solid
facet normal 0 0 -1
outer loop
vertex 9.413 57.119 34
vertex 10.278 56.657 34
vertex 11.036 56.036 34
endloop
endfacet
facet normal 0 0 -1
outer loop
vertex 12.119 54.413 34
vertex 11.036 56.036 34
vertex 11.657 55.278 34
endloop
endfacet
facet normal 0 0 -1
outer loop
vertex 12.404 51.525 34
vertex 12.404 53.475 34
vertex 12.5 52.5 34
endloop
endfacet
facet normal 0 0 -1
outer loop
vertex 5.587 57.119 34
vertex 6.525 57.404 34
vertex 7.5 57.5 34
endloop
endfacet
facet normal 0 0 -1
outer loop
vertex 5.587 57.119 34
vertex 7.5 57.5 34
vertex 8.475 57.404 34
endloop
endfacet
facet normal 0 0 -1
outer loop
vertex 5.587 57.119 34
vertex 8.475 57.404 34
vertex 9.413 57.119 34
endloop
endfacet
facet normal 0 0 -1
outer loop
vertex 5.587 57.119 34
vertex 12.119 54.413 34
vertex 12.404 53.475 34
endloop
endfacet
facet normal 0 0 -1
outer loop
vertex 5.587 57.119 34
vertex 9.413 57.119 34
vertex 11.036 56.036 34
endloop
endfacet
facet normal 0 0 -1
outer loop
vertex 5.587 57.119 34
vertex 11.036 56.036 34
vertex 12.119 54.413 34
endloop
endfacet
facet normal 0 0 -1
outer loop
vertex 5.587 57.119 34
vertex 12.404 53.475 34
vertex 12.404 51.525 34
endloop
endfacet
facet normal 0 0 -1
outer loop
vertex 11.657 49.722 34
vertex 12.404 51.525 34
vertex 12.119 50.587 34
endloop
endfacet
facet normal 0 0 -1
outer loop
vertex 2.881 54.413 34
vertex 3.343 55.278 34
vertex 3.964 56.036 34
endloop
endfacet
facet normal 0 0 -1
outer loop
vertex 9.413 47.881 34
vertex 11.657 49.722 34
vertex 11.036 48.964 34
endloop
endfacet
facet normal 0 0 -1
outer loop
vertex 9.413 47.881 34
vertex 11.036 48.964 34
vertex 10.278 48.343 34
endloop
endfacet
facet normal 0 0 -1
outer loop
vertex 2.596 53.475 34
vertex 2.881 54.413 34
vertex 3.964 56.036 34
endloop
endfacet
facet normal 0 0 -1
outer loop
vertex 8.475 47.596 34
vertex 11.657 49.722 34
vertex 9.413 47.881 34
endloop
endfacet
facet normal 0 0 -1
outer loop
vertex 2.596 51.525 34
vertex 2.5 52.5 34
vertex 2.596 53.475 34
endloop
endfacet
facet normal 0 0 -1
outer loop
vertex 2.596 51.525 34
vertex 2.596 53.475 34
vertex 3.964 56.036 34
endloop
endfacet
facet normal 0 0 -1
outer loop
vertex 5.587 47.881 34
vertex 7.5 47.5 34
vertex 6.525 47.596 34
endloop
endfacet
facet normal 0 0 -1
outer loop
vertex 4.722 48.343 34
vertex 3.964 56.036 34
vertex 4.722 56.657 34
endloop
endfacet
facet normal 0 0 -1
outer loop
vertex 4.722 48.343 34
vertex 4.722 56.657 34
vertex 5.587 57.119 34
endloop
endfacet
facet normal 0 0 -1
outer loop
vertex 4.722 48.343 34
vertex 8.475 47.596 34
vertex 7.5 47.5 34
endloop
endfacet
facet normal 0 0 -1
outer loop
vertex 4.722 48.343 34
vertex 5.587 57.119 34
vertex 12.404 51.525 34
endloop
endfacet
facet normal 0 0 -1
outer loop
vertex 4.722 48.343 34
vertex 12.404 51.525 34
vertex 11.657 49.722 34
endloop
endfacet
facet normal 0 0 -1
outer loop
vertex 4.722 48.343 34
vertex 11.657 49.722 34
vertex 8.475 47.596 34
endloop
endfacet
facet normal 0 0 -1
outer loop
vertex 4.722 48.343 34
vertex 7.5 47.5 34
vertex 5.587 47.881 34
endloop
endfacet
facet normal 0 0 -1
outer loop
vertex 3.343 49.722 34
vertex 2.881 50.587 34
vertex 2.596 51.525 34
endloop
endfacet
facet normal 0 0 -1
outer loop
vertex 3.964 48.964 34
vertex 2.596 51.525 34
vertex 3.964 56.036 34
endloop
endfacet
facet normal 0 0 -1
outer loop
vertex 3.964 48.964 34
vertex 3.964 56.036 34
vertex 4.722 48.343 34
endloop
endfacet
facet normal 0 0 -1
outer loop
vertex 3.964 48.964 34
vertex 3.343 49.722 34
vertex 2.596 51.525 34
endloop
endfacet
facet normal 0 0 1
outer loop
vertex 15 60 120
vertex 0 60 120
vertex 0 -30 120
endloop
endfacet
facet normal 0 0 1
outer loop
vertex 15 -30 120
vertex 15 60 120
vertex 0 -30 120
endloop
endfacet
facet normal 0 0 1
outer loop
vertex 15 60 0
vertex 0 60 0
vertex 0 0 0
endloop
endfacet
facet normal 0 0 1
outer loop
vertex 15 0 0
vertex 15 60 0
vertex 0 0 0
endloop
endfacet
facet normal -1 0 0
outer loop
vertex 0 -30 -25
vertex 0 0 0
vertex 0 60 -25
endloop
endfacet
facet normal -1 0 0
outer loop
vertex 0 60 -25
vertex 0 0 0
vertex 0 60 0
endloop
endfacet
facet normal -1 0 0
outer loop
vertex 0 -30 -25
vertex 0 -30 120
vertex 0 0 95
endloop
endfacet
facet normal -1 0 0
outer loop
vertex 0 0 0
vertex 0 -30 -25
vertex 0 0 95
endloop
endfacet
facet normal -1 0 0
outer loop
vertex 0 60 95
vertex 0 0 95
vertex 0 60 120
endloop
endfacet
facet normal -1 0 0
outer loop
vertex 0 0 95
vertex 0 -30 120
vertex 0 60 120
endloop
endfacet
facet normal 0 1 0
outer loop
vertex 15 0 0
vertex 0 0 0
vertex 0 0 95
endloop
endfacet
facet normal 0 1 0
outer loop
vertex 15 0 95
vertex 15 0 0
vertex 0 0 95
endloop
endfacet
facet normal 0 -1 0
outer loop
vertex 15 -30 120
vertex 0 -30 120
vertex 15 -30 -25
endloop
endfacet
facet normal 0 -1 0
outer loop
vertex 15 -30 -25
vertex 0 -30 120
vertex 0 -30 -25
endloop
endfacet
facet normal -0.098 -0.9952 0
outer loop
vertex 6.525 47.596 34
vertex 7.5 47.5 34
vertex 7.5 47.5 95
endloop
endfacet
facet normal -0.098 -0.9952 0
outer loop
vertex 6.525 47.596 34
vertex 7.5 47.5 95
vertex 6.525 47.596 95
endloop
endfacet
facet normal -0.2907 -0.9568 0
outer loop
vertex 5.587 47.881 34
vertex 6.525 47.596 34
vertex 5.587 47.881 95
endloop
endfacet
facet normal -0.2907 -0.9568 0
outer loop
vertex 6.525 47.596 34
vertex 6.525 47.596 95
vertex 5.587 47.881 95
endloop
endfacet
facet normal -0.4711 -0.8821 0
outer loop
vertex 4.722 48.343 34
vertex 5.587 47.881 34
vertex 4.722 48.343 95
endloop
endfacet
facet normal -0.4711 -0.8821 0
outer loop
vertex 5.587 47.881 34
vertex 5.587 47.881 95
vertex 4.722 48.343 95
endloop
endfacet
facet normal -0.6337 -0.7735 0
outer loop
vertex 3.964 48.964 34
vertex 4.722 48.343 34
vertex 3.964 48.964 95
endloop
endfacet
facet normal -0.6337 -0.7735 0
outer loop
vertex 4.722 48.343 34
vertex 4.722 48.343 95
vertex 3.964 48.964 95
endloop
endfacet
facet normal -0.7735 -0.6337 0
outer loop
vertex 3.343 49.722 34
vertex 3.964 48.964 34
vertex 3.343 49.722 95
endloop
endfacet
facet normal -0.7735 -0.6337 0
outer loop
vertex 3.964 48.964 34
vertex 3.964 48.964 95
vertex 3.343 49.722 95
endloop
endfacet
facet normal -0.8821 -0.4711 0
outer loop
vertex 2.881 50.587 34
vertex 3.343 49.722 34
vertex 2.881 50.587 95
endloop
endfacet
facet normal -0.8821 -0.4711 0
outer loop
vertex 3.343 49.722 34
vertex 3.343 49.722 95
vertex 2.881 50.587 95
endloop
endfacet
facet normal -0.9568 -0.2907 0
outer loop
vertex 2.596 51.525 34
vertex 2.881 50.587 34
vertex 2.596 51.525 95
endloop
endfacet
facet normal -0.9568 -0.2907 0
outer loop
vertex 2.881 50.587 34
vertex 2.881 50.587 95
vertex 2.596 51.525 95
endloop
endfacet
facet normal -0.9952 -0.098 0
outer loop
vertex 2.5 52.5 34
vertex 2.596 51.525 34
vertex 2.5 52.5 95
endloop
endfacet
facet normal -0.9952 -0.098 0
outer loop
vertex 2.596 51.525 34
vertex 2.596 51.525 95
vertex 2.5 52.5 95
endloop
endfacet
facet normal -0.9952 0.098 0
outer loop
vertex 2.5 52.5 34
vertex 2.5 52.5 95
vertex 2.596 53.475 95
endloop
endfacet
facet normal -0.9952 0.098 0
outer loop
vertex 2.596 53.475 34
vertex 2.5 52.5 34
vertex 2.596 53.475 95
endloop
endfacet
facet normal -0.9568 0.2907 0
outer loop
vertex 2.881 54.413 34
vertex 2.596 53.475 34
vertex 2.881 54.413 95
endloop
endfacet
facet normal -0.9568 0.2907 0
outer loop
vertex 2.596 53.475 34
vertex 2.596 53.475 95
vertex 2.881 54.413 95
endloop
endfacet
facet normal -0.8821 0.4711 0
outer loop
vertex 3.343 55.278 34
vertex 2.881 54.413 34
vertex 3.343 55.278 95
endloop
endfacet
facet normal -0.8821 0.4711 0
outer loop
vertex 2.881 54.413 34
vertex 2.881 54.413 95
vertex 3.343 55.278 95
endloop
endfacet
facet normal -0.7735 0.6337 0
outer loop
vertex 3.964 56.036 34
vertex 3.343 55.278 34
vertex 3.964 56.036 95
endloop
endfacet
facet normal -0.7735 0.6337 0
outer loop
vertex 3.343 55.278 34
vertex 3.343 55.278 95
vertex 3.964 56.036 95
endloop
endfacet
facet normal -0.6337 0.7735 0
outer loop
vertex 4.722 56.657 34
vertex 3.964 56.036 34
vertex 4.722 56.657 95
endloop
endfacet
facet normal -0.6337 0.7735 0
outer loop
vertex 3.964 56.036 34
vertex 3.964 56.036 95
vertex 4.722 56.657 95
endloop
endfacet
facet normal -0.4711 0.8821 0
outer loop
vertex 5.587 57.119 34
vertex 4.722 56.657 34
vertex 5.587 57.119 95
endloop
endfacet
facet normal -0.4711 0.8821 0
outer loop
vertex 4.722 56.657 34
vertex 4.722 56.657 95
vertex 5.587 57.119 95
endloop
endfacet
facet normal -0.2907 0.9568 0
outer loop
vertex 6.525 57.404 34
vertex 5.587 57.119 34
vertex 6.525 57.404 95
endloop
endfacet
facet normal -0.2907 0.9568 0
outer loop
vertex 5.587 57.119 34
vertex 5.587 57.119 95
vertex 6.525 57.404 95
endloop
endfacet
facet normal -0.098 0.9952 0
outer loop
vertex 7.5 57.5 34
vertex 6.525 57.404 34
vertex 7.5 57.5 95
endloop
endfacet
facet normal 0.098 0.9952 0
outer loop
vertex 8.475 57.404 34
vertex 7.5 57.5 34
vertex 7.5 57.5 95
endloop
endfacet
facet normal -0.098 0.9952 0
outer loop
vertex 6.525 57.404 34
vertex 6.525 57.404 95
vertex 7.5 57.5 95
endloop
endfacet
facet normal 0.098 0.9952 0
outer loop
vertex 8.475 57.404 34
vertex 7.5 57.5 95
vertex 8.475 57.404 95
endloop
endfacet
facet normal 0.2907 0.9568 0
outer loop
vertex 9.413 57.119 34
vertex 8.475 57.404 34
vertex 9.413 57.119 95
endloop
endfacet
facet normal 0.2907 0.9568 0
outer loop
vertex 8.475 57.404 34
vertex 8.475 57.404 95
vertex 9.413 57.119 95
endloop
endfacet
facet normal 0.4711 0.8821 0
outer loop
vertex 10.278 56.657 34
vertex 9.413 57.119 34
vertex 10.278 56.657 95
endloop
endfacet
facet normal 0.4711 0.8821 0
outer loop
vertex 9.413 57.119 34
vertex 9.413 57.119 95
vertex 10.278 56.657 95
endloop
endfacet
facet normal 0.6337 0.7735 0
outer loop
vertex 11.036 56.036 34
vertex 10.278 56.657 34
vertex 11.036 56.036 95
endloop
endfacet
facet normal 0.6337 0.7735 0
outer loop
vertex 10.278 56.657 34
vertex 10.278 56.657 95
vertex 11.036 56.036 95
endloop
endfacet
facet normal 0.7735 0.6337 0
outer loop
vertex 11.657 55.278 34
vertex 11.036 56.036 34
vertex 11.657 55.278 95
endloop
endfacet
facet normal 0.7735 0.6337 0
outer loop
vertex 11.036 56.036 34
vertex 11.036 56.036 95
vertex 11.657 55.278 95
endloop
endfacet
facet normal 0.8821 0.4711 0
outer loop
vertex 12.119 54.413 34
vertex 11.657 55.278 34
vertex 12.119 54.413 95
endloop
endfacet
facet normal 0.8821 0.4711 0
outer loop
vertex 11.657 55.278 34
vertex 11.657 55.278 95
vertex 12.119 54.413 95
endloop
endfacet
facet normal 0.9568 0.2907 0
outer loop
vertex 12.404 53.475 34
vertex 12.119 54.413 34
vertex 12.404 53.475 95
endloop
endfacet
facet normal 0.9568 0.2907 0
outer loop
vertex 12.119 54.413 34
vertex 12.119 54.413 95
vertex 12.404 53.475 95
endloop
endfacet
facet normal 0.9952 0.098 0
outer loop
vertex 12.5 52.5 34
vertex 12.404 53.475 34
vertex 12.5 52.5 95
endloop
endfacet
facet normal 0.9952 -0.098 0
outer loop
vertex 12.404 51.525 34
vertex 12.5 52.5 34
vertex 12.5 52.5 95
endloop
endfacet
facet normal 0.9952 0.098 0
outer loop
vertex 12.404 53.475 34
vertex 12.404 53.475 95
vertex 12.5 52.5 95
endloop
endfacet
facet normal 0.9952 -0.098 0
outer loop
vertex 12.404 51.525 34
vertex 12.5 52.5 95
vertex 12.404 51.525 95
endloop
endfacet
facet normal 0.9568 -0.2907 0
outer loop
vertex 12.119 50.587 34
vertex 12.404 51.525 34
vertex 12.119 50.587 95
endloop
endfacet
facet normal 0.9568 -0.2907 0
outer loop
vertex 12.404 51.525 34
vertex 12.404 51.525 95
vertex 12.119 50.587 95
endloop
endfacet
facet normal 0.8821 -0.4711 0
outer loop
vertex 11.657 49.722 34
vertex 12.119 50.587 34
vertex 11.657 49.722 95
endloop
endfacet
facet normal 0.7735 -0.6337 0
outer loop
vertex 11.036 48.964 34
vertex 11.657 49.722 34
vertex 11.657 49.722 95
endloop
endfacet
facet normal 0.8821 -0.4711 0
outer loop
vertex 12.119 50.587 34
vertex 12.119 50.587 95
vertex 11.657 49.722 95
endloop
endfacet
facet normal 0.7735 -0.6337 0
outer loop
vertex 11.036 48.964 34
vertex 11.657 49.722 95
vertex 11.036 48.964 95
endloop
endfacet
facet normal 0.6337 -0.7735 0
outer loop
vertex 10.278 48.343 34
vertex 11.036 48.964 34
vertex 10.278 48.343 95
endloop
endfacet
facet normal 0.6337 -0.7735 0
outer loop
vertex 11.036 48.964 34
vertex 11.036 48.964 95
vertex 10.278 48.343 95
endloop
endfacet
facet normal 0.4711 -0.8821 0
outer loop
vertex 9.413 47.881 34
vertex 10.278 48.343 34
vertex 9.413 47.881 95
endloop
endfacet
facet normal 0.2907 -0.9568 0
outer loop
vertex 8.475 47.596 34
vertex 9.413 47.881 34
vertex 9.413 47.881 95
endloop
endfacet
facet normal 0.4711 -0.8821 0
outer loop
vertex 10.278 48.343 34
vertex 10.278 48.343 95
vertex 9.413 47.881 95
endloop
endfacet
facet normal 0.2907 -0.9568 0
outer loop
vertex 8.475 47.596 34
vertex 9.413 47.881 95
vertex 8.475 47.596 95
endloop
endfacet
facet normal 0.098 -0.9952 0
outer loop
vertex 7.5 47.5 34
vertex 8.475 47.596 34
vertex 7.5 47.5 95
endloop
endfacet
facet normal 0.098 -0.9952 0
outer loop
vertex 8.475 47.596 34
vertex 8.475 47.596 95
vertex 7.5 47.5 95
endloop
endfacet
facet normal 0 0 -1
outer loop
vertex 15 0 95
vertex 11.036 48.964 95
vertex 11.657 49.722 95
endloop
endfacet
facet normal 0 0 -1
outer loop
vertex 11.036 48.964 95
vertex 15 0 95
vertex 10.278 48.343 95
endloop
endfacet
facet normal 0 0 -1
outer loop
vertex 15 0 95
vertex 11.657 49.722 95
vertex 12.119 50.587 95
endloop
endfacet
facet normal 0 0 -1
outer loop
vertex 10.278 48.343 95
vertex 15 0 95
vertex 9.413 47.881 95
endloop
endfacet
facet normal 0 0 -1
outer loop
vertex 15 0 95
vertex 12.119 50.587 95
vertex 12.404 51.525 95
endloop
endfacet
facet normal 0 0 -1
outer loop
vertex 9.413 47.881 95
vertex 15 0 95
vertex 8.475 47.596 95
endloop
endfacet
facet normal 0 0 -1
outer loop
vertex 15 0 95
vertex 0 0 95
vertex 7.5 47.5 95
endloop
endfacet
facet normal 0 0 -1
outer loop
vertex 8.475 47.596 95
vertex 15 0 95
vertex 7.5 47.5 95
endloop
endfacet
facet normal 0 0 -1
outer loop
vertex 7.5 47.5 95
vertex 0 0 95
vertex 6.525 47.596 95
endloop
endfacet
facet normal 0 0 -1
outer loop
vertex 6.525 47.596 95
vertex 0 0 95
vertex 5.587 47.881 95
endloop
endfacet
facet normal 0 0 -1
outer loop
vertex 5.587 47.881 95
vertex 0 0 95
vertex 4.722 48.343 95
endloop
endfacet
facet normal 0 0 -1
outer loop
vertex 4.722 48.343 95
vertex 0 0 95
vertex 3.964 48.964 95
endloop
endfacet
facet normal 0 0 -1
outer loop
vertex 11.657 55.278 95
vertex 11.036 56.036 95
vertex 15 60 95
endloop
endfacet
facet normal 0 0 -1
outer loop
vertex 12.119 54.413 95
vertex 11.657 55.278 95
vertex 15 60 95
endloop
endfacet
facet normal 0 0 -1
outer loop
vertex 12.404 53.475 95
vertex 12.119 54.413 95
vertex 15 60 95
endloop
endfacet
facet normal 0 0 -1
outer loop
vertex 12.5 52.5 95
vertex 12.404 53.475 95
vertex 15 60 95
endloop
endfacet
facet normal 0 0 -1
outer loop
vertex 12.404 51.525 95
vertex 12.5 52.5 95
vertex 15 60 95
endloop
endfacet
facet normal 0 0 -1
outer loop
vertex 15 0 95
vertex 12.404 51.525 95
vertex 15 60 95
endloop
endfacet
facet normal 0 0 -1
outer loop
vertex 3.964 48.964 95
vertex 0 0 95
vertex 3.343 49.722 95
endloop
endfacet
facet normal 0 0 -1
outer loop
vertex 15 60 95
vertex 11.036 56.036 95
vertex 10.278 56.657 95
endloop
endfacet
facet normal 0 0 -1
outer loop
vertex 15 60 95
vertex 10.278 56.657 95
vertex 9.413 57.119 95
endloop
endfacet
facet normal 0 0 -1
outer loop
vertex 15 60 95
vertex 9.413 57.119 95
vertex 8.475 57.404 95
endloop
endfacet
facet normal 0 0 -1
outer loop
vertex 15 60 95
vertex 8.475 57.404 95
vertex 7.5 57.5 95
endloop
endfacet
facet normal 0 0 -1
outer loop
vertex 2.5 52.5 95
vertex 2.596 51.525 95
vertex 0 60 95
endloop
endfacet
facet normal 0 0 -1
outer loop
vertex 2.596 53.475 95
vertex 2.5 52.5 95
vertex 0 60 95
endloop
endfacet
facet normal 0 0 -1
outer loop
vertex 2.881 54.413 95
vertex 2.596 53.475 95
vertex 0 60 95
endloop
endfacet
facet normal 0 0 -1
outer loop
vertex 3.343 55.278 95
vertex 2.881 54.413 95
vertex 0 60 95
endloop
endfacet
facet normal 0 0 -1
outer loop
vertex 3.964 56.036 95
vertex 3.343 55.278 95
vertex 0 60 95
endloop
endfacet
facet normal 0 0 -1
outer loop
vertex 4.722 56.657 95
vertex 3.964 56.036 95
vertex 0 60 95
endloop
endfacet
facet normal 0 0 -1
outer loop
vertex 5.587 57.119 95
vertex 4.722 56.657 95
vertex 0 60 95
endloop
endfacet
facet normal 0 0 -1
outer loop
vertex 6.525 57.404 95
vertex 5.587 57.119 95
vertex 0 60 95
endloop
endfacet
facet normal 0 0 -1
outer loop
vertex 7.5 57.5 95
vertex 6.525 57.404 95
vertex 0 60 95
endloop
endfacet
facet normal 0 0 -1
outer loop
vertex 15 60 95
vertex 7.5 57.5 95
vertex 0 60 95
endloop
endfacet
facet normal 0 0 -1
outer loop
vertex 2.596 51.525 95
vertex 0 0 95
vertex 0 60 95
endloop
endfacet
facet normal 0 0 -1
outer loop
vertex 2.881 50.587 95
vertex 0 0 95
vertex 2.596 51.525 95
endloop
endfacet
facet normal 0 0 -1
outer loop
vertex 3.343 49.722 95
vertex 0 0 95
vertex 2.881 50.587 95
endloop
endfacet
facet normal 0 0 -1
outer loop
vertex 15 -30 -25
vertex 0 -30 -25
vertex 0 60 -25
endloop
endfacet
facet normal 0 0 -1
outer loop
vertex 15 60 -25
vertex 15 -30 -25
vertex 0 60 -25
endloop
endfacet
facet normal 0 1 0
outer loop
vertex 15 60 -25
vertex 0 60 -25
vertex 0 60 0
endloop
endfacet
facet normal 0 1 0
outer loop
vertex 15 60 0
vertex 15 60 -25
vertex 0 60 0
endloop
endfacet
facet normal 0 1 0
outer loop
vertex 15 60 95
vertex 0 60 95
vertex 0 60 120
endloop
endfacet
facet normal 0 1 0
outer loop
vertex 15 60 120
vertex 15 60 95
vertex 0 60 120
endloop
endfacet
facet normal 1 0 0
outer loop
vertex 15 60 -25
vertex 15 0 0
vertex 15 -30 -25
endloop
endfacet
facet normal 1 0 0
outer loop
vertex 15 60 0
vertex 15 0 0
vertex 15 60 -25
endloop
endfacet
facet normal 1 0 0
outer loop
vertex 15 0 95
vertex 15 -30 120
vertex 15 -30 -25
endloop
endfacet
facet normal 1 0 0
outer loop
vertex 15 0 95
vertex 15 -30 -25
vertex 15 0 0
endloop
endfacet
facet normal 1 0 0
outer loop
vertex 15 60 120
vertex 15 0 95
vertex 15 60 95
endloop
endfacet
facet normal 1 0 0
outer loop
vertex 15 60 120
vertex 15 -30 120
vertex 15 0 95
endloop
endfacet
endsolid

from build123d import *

# Parameters (mm, degrees)
BOSS_EXTRUDE1_DEPTH = 15
SKETCH2_R           = 5
BOSS_EXTRUDE2_DEPTH = 61


with BuildPart() as part:
    # Sketch1 → Boss-Extrude1 (new body)
    with BuildSketch(Plane.YZ):
        Polygon((0, 0), (0, 95), (60, 95), (60, 120), (-30, 120), (-30, -25), (60, -25), (60, 0), align=None)
    extrude(amount=BOSS_EXTRUDE1_DEPTH)

    # Sketch2 → Boss-Extrude2 (add)
    with BuildSketch(Plane(origin=(0, 0, 95), x_dir=(1, 0, 0), z_dir=(0, 0, -1))):
        with Locations(Location((7.5, -52.5, 0), (0, 0, 90))):
            Circle(SKETCH2_R)
    extrude(amount=BOSS_EXTRUDE2_DEPTH)


solid = part.part
